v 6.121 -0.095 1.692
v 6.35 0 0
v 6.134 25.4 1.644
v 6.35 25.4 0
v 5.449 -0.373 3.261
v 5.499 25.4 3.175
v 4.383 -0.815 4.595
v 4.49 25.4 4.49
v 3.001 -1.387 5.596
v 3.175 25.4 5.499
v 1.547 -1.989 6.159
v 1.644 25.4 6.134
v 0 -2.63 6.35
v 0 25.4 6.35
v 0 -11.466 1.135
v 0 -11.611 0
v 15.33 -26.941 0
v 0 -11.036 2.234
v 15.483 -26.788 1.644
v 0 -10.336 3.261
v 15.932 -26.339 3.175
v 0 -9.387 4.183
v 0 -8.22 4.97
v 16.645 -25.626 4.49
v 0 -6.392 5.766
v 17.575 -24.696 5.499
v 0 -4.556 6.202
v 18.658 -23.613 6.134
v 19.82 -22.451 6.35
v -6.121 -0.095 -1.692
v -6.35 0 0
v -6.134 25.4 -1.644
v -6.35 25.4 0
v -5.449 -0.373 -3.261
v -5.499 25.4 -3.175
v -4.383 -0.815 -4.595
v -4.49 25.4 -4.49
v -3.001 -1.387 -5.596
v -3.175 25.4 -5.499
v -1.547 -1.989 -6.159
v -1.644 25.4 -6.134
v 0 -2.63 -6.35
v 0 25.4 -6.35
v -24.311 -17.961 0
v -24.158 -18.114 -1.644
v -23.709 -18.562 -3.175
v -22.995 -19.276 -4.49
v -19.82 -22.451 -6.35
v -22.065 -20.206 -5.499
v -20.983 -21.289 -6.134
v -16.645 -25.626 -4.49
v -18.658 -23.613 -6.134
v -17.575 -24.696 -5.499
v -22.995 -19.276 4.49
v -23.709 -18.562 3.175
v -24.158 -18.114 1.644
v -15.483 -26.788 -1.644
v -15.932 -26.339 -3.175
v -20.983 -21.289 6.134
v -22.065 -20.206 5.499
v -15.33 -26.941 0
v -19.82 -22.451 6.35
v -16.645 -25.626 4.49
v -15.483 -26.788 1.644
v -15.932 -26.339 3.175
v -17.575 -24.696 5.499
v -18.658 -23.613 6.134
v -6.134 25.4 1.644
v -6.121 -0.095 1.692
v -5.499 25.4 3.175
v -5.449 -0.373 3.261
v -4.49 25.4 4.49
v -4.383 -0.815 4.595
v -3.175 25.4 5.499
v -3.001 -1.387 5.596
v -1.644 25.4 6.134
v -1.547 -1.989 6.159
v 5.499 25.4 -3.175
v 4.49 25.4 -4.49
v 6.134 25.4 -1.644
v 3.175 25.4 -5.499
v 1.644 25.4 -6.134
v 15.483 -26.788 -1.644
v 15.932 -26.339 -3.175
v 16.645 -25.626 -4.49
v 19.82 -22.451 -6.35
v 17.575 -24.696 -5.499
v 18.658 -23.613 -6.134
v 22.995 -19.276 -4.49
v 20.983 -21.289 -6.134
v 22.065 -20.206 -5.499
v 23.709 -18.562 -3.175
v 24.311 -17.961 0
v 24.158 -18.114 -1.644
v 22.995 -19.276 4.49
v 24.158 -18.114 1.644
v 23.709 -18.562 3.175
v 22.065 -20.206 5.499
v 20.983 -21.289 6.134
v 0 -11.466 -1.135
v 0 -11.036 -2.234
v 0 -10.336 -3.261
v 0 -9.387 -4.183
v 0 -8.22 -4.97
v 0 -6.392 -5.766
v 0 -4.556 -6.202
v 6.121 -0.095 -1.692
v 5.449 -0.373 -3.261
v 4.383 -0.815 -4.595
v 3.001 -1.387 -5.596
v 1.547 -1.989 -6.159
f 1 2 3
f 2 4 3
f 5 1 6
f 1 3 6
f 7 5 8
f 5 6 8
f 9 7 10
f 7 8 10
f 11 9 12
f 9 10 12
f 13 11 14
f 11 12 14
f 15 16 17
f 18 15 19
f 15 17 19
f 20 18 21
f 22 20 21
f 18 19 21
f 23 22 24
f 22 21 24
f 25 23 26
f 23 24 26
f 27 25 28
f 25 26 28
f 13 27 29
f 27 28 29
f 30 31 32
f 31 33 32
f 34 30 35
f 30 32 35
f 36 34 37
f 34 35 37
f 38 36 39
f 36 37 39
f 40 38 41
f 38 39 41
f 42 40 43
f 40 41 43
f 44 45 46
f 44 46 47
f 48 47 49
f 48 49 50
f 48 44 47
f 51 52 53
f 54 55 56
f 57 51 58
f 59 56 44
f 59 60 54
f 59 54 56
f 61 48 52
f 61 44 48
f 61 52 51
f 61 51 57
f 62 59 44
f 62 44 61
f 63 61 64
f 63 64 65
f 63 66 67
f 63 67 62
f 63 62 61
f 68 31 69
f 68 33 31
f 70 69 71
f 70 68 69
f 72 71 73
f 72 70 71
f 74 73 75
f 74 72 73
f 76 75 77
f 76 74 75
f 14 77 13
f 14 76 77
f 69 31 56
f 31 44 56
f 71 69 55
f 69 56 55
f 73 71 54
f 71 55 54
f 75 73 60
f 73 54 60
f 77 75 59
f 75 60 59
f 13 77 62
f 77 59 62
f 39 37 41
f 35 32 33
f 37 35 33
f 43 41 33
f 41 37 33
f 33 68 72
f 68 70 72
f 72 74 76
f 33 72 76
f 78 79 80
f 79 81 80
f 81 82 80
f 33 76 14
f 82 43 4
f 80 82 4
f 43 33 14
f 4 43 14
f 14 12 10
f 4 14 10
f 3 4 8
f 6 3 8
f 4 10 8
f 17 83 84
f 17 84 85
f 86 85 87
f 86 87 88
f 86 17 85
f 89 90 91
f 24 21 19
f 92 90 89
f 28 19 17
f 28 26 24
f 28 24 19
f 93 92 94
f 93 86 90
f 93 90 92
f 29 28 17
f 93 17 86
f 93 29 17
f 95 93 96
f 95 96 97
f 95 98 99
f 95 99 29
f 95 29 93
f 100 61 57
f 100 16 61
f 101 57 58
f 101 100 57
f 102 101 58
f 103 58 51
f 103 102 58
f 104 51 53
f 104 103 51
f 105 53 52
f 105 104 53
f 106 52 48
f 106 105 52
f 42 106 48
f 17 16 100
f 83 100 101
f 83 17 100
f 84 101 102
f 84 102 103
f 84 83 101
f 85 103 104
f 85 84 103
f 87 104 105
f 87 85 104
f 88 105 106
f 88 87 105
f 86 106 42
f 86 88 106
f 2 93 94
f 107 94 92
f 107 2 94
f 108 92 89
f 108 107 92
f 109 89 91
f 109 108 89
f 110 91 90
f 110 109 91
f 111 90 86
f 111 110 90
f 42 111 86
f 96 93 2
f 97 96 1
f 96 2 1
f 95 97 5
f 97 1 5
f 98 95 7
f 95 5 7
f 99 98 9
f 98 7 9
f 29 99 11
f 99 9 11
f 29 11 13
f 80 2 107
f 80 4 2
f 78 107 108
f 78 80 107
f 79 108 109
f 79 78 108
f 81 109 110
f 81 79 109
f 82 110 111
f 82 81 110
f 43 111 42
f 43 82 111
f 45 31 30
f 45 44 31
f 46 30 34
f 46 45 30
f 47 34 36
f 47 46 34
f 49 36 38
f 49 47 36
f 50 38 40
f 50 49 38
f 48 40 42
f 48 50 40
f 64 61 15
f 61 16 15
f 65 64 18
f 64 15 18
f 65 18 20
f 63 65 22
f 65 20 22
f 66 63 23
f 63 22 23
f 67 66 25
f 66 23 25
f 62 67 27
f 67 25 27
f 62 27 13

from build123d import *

# Parameters (mm, degrees)
F0_W     = 12.7
F0_H     = 25.4
F1_DEPTH = 6.35
F2_R     = 6.34999


# Not quite as in the source:
# - a fillet or chamfer is up to 0.001 mm smaller than in the source, because OpenCascade refuses the exact size


with BuildPart() as f1:
    # F0 (on Top) → F1 (new body, symmetric)
    with BuildSketch(Plane.XY):
        Polygon((6.35, 0), (-6.35, 0), (-24.3105122421, -17.9605122421), (-15.3302561211, -26.9407683632), (0, -11.6105122421), (15.3302561211, -26.9407683632), (24.3105122421, -17.9605122421), align=None)
        with Locations((0, 12.7)):
            Rectangle(F0_W, F0_H)
    extrude(amount=F1_DEPTH, both=True)

    # F2 (radius 6.35 in the source; OpenCascade refuses exactly that, so slightly less here)
    f2_edges = [f1.edges().sort_by_distance(p)[0] for p in [
        (6.35, 12.7, 6.35),
        (6.35, 12.7, -6.35),
        (-6.35, 12.7, 6.35),
        (-6.35, 12.7, -6.35),
        (15.330256, -8.980256, 6.35),
        (15.330256, -8.980256, -6.35),
        (7.665128, -19.27564, 6.35),
        (7.665128, -19.27564, -6.35),
        (-7.665128, -19.27564, 6.35),
        (-7.665128, -19.27564, -6.35),
        (-15.330256, -8.980256, 6.35),
        (-15.330256, -8.980256, -6.35),
    ]]
    fillet(f2_edges, radius=F2_R)


solid = f1.part
